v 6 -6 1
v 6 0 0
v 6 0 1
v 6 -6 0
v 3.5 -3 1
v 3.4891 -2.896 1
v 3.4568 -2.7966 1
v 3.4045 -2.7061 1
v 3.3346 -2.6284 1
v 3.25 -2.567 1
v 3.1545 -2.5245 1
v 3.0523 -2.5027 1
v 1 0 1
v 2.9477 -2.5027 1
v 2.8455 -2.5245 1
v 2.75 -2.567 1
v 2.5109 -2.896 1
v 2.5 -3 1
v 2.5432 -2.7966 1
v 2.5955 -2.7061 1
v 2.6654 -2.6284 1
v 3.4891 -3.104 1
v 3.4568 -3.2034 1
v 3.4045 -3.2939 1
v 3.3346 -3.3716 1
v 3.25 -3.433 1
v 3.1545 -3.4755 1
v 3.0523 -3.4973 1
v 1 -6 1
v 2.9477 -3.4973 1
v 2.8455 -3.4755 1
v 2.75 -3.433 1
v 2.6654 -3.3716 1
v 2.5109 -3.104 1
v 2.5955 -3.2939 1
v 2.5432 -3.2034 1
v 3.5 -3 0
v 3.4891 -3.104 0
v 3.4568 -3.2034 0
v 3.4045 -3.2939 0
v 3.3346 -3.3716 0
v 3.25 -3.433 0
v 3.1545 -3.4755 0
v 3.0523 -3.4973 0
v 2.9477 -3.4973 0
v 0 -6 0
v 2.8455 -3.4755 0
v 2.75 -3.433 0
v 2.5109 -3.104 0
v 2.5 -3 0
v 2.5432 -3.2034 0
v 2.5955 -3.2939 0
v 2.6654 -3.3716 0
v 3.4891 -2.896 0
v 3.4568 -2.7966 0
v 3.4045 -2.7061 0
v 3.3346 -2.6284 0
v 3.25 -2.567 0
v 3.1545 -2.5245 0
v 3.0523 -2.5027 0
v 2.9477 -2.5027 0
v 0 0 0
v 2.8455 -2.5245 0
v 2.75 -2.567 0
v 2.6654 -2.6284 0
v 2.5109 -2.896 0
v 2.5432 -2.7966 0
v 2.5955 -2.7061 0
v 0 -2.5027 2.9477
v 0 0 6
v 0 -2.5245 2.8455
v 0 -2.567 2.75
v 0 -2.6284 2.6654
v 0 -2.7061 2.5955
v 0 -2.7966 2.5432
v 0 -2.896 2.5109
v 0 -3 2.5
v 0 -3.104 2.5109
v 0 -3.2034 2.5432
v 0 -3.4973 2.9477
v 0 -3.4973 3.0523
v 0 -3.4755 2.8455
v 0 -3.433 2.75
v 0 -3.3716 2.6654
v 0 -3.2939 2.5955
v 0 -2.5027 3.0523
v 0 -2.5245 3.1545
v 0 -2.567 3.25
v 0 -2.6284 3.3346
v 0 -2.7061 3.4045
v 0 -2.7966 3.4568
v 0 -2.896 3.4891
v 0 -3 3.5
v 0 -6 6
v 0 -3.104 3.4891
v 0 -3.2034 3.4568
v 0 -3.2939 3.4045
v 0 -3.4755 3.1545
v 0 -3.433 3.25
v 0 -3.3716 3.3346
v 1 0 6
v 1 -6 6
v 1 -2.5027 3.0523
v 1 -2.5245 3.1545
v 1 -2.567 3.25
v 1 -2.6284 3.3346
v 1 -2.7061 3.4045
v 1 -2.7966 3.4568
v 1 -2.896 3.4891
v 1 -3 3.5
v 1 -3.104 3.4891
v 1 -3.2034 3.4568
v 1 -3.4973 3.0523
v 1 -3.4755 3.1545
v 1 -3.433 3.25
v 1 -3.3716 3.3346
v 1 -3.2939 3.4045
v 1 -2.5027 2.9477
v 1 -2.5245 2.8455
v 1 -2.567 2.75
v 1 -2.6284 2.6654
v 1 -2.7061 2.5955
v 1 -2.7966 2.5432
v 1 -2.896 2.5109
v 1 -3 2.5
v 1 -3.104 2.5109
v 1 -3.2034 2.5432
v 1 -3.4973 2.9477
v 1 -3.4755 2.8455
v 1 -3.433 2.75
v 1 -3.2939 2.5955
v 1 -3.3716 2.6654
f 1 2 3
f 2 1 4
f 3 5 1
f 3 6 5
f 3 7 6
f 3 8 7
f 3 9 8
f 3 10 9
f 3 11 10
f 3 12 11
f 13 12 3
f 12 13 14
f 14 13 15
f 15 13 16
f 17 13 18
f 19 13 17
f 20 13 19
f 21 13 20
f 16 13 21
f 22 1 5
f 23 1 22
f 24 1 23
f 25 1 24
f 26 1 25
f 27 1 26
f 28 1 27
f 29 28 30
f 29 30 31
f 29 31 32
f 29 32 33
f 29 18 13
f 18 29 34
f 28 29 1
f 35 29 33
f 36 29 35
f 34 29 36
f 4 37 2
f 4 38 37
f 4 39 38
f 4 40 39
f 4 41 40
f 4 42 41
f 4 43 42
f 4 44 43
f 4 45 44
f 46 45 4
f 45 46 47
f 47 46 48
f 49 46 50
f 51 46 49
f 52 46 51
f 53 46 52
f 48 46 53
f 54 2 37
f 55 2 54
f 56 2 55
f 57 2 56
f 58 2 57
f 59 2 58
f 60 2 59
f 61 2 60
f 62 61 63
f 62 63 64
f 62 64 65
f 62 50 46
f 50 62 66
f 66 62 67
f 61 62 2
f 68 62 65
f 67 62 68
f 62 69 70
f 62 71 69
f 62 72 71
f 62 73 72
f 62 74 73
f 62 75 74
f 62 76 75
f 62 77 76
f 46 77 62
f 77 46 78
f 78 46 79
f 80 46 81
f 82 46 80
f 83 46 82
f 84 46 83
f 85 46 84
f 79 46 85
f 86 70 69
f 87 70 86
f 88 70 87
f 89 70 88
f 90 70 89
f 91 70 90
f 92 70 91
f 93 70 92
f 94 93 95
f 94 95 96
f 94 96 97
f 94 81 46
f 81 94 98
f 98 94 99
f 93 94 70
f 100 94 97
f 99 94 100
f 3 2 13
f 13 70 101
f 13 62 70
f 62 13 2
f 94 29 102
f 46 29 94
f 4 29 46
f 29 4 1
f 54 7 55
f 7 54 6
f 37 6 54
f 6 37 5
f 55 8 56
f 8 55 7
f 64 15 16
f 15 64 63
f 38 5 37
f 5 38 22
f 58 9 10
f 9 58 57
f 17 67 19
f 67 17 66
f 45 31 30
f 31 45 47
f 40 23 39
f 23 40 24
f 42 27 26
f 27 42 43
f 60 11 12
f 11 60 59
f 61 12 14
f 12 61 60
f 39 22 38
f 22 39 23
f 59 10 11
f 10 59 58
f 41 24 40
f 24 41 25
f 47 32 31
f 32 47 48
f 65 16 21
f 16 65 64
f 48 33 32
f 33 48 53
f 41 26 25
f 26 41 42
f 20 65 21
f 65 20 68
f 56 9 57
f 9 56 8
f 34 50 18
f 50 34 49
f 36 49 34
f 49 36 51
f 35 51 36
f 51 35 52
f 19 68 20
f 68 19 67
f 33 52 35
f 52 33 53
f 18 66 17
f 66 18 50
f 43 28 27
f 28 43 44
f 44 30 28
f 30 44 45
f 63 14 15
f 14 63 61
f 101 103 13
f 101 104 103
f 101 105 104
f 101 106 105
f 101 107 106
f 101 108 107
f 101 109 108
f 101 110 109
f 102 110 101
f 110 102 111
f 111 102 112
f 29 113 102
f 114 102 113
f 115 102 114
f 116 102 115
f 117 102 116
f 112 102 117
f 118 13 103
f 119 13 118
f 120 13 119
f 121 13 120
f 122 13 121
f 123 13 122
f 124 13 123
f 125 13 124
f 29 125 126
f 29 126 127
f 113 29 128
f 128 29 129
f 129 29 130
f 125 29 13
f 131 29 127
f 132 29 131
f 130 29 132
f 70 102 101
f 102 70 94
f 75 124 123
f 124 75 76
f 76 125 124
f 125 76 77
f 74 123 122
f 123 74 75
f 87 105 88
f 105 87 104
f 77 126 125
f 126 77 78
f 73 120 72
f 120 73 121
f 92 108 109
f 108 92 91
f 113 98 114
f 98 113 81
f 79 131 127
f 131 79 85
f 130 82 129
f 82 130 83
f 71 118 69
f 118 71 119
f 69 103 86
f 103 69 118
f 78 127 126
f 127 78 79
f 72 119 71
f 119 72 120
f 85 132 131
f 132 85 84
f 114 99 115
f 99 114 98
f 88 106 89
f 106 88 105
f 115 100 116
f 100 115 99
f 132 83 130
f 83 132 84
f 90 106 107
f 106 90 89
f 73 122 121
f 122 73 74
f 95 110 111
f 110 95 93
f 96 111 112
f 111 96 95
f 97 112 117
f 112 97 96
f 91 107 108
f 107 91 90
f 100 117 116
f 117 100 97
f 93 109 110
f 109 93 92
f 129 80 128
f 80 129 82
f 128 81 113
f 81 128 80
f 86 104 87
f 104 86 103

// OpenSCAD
module plate() {
    difference(){
    
        cube([6,6,1]);
        translate([3,3,0]) {
            cylinder(r = 0.5, h = 1, $fn = 30);
        }
    }
}



union(){

translate([0,-6,0]) { 
    plate();
}


rotate(a = 90, v= [0, 1, 0 ])  {
    translate([-6, -6, 0]) plate();
}
}
